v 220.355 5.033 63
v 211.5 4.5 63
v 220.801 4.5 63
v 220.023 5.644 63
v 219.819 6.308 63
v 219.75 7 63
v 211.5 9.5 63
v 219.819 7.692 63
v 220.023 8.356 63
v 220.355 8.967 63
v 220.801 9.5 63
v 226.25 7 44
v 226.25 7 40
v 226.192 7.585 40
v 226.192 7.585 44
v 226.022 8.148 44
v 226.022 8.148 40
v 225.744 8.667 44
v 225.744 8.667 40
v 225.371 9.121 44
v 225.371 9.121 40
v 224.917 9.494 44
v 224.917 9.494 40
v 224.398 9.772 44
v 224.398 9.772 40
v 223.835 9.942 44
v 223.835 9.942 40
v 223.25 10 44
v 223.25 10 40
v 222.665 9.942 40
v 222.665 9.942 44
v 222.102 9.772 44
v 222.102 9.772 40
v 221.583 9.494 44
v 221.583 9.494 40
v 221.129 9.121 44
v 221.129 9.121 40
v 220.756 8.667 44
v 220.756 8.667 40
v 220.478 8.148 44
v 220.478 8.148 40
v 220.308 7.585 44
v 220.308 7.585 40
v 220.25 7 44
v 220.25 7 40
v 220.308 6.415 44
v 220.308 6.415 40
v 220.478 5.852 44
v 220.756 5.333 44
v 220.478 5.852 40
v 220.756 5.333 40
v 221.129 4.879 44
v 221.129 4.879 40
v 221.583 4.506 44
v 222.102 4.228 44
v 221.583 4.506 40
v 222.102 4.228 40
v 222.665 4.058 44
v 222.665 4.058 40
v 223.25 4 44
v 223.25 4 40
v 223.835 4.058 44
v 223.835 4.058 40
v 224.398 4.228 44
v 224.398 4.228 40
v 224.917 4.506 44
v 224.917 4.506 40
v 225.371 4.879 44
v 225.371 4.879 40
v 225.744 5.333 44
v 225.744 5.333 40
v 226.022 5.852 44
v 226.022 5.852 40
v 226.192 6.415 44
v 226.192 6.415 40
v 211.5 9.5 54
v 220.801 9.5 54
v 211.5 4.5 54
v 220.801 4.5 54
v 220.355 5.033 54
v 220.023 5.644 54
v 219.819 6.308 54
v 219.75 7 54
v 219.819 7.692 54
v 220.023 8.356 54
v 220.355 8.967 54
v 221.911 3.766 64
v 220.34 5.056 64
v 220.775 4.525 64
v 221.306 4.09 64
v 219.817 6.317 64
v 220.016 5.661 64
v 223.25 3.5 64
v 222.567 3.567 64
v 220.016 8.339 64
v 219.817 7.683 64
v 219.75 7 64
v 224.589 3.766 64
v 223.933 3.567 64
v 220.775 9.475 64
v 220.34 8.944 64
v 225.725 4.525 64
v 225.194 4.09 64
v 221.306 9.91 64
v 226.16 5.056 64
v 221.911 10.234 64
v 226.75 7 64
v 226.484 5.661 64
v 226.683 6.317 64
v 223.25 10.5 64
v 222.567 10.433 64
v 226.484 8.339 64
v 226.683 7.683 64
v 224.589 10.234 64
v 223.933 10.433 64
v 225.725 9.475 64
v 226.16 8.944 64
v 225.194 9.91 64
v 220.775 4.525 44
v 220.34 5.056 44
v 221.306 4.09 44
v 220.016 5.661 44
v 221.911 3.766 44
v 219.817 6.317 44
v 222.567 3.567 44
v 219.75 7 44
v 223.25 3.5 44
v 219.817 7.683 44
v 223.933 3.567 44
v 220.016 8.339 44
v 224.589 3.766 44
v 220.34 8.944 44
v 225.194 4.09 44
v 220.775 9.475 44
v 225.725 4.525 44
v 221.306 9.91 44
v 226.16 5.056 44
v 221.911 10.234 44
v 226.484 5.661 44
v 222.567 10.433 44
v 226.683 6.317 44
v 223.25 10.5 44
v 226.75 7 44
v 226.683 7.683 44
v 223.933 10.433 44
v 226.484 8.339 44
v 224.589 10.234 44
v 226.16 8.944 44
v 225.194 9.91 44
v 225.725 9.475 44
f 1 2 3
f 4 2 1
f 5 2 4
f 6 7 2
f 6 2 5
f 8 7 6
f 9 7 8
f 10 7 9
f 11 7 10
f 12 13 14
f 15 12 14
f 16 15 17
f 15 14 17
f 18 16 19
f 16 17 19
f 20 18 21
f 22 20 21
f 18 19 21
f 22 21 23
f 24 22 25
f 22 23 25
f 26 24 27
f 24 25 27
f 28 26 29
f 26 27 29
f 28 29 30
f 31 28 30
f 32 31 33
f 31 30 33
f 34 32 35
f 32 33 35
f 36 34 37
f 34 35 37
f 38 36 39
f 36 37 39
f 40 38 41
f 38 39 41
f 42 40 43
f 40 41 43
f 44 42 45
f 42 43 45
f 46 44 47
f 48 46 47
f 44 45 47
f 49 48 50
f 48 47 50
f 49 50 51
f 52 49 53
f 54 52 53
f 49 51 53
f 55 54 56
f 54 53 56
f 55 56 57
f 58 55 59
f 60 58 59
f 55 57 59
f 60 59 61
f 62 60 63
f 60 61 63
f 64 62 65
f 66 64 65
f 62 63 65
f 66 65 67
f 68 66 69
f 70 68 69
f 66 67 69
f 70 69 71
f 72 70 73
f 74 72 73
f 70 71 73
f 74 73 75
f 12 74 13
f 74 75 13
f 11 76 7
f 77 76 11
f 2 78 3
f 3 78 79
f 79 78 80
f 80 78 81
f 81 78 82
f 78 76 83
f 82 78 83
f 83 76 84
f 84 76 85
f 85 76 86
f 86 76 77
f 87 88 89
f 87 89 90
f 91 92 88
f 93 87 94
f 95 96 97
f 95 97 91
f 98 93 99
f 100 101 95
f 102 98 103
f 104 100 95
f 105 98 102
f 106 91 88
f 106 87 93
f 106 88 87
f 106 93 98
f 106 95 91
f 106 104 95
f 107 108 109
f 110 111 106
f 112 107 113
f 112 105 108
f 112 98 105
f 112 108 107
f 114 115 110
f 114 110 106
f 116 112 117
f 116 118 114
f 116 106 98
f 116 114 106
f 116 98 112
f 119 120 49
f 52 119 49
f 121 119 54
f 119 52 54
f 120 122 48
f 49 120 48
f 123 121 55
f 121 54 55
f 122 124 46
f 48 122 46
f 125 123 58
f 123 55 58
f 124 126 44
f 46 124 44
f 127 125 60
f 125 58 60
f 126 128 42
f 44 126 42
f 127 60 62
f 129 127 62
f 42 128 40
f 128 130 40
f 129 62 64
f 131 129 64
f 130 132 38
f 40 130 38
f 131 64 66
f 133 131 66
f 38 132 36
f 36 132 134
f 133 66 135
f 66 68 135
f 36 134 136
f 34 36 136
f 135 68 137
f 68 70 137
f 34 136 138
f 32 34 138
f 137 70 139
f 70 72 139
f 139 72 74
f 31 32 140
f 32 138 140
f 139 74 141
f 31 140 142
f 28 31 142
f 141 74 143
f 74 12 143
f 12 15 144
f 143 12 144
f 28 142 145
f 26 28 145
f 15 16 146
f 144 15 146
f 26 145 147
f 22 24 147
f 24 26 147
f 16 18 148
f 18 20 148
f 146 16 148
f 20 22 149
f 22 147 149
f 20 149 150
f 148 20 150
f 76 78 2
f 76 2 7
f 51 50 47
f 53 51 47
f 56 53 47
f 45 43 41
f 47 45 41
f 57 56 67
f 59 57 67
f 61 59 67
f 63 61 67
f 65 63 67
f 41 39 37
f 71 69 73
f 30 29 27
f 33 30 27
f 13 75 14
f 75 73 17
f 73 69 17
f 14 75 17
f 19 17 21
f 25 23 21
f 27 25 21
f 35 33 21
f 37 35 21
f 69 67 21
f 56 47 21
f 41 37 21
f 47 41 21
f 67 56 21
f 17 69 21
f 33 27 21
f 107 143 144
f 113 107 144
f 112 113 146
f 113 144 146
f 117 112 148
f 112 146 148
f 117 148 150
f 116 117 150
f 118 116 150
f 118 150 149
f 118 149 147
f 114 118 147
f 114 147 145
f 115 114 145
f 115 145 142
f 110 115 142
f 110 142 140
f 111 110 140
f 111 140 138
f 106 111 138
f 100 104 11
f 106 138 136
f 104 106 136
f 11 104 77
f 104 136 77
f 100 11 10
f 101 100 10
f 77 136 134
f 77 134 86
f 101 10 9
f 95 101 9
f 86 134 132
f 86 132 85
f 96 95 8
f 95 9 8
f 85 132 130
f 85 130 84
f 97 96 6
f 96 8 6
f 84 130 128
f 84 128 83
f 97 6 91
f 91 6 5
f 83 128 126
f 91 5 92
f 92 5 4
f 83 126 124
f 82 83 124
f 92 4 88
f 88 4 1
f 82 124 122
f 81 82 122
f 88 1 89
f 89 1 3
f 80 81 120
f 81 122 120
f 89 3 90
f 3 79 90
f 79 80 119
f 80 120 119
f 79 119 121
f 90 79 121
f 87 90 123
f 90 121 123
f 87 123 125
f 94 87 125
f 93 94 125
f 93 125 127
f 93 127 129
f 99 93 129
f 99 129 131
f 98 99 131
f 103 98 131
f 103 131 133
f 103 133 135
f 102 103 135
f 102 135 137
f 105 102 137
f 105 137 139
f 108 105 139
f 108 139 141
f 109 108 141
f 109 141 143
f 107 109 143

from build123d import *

# Parameters (mm, degrees)
BOX012_W          = 10
BOX012_H          = 5
BOX012_DEPTH      = 9
CYLINDER001_R     = 3
CYLINDER001_DEPTH = 4
CYLINDER_R        = 3.5
CYLINDER_DEPTH    = 20


with BuildPart() as cube010:
    # Box012 → Box012 (new body)
    with BuildSketch(Plane.XY):
        with Locations((5, 2.5)):
            Rectangle(BOX012_W, BOX012_H)
    extrude(amount=BOX012_DEPTH)


with BuildPart() as cylinder001:
    # Cylinder001 → Cylinder001 (new body)
    with BuildSketch(Plane(origin=(11.75, 2.5, -14), x_dir=(1, 0, 0), z_dir=(0, 0, 1))):
        Circle(CYLINDER001_R)
    extrude(amount=CYLINDER001_DEPTH)


with BuildPart() as usb:
    # Cylinder → Cylinder (new body)
    with BuildSketch(Plane(origin=(11.75, 2.5, -10), x_dir=(1, 0, 0), z_dir=(0, 0, 1))):
        Circle(CYLINDER_R)
    extrude(amount=CYLINDER_DEPTH)

    # Fusion001: union Cube010, Cylinder001
    add(cube010.part)
    add(cylinder001.part)


with BuildPart() as usb_1:
    # Fusion001 placement: moved
    add(usb.part.moved(Location((211.5, 4.5, 54))))


solid = usb_1.part
